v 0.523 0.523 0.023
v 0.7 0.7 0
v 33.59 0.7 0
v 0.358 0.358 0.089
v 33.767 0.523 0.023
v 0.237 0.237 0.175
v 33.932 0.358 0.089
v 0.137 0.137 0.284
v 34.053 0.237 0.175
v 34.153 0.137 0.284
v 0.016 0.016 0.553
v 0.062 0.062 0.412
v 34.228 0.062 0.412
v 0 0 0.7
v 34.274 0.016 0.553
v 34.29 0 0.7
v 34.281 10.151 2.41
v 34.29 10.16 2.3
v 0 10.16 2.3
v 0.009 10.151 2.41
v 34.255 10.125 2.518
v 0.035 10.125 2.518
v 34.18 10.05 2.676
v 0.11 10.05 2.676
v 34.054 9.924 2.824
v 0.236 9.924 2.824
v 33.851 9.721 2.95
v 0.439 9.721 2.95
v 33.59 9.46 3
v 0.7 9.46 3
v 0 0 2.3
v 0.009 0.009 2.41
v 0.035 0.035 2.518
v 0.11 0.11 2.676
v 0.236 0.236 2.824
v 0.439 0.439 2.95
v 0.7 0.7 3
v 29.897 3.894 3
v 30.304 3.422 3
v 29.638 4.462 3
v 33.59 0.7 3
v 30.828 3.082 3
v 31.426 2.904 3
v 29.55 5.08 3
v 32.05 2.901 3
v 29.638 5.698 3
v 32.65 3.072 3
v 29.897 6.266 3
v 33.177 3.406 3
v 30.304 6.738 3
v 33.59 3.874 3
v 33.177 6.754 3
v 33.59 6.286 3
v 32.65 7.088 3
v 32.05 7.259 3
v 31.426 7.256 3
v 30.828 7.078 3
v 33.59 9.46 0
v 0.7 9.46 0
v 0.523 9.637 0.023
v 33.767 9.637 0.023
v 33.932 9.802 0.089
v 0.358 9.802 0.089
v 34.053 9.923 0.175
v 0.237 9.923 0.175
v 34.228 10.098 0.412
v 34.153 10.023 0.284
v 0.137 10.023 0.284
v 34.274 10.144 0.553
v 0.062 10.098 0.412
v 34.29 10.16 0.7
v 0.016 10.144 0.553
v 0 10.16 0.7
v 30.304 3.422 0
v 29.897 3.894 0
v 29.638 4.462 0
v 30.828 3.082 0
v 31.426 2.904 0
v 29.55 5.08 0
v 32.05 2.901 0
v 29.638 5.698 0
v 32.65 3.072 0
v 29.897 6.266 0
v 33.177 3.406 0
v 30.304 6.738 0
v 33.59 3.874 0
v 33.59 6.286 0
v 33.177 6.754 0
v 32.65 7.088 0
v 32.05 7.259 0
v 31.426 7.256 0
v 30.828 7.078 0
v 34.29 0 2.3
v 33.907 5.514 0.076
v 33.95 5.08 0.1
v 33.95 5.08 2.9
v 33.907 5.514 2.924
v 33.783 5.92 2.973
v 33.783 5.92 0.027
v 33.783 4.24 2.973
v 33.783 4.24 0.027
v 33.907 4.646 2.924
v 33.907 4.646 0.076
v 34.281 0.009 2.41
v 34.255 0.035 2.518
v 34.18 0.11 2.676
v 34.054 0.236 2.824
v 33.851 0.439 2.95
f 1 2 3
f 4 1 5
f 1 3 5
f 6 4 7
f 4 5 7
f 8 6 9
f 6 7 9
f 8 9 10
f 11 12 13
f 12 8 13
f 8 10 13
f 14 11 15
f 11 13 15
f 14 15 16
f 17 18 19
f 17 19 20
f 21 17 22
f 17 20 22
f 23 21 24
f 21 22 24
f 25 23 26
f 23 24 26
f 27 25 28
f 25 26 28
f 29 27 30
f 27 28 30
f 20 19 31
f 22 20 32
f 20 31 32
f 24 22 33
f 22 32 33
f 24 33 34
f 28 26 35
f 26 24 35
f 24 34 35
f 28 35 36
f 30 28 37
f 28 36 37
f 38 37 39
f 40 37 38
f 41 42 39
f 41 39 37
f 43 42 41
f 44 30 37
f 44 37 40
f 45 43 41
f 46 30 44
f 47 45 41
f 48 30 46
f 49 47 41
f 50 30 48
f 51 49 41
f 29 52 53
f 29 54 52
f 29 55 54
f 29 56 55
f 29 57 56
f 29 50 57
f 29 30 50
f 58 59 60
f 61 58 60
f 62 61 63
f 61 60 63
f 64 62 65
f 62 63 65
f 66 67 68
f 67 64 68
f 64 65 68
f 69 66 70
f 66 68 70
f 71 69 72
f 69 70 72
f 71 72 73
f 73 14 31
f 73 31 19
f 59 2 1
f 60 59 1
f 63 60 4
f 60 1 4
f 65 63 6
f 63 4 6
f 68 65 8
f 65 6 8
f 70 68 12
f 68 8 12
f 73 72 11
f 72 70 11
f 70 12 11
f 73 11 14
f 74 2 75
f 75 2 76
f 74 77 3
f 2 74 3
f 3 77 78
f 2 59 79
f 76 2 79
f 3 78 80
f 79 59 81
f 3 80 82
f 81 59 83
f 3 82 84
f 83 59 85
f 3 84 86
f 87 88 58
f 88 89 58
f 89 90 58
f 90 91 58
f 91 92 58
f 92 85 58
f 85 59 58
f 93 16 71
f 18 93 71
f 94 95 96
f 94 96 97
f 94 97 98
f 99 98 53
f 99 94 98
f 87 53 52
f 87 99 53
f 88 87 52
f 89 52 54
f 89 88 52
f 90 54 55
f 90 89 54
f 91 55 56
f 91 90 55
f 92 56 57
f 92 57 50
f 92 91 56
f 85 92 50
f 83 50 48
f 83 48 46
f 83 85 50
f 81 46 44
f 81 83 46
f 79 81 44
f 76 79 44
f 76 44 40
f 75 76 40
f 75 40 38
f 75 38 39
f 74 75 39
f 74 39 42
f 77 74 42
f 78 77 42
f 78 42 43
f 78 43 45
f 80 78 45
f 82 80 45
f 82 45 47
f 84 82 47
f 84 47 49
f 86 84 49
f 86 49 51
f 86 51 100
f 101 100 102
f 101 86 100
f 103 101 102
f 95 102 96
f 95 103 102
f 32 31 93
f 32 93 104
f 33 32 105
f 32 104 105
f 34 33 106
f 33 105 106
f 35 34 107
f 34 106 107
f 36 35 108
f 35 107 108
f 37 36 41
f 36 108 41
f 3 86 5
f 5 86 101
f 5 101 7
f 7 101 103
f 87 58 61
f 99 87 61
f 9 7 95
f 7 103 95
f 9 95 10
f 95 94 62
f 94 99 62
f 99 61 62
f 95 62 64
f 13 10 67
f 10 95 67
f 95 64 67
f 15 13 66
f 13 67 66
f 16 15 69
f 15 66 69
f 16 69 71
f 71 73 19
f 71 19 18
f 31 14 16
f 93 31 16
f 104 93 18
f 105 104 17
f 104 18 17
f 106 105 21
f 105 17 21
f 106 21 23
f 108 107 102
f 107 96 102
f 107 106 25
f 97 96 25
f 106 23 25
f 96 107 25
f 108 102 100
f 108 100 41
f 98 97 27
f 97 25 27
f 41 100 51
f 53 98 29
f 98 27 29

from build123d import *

# Parameters (mm, degrees)
SKETCH1_W           = 34.29
SKETCH1_H           = 10.16
SKETCH1_R           = 2.2
BOSS_EXTRUDE1_DEPTH = 3
FILLET1_R           = 0.7


with BuildPart() as part:
    # Sketch1 → Boss-Extrude1 (new body)
    with BuildSketch(Plane.XY):
        with Locations((17.145, 5.08)):
            Rectangle(SKETCH1_W, SKETCH1_H)
        with Locations((31.75, 5.08)):
            Circle(SKETCH1_R, mode=Mode.SUBTRACT)
    extrude(amount=BOSS_EXTRUDE1_DEPTH)

    # Fillet1
    # the kernel refuses this fillet: 0.7 mm, written as the material it takes off along each edge
    with BuildSketch(Plane(origin=(34.29, 11.91, 3), x_dir=(0, 0, -1), z_dir=(0, -1, 0)), Plane(origin=(0, -1.75, 3), x_dir=(0, 0, -1), z_dir=(0, 1, 0))) as fillet1_piece_1:
        with BuildLine():
            CenterArc((FILLET1_R, -FILLET1_R), FILLET1_R, 90, 90)
            Line((0, -FILLET1_R), (0, 0))
            Line((0, 0), (FILLET1_R, 0))
        make_face()
    extrude(amount=13.66, mode=Mode.SUBTRACT)
    with BuildSketch(Plane(origin=(-1.75, 10.16, 3), x_dir=(0, 0, -1), z_dir=(1, 0, 0)), Plane(origin=(36.04, 0, 3), x_dir=(0, 0, -1), z_dir=(-1, 0, 0))) as fillet1_piece_2:
        with BuildLine():
            CenterArc((FILLET1_R, -FILLET1_R), FILLET1_R, 90, 90)
            Line((0, -FILLET1_R), (0, 0))
            Line((0, 0), (FILLET1_R, 0))
        make_face()
    extrude(amount=37.79, mode=Mode.SUBTRACT)
    with BuildSketch(Plane(origin=(-1.75, 10.16, 0), x_dir=(0, 0, 1), z_dir=(1, 0, 0)), Plane(origin=(36.04, 0, 0), x_dir=(0, 0, 1), z_dir=(-1, 0, 0))) as fillet1_piece_3:
        with BuildLine():
            CenterArc((FILLET1_R, FILLET1_R), FILLET1_R, 180, 90)
            Line((0, FILLET1_R), (0, 0))
            Line((0, 0), (FILLET1_R, 0))
        make_face()
    extrude(amount=37.79, mode=Mode.SUBTRACT)
    with BuildSketch(Plane(origin=(34.29, 11.91, 0), x_dir=(0, 0, 1), z_dir=(0, -1, 0)), Plane(origin=(0, -1.75, 0), x_dir=(0, 0, 1), z_dir=(0, 1, 0))) as fillet1_piece_4:
        with BuildLine():
            CenterArc((FILLET1_R, FILLET1_R), FILLET1_R, 180, 90)
            Line((0, FILLET1_R), (0, 0))
            Line((0, 0), (FILLET1_R, 0))
        make_face()
    extrude(amount=13.66, mode=Mode.SUBTRACT)


solid = part.part
